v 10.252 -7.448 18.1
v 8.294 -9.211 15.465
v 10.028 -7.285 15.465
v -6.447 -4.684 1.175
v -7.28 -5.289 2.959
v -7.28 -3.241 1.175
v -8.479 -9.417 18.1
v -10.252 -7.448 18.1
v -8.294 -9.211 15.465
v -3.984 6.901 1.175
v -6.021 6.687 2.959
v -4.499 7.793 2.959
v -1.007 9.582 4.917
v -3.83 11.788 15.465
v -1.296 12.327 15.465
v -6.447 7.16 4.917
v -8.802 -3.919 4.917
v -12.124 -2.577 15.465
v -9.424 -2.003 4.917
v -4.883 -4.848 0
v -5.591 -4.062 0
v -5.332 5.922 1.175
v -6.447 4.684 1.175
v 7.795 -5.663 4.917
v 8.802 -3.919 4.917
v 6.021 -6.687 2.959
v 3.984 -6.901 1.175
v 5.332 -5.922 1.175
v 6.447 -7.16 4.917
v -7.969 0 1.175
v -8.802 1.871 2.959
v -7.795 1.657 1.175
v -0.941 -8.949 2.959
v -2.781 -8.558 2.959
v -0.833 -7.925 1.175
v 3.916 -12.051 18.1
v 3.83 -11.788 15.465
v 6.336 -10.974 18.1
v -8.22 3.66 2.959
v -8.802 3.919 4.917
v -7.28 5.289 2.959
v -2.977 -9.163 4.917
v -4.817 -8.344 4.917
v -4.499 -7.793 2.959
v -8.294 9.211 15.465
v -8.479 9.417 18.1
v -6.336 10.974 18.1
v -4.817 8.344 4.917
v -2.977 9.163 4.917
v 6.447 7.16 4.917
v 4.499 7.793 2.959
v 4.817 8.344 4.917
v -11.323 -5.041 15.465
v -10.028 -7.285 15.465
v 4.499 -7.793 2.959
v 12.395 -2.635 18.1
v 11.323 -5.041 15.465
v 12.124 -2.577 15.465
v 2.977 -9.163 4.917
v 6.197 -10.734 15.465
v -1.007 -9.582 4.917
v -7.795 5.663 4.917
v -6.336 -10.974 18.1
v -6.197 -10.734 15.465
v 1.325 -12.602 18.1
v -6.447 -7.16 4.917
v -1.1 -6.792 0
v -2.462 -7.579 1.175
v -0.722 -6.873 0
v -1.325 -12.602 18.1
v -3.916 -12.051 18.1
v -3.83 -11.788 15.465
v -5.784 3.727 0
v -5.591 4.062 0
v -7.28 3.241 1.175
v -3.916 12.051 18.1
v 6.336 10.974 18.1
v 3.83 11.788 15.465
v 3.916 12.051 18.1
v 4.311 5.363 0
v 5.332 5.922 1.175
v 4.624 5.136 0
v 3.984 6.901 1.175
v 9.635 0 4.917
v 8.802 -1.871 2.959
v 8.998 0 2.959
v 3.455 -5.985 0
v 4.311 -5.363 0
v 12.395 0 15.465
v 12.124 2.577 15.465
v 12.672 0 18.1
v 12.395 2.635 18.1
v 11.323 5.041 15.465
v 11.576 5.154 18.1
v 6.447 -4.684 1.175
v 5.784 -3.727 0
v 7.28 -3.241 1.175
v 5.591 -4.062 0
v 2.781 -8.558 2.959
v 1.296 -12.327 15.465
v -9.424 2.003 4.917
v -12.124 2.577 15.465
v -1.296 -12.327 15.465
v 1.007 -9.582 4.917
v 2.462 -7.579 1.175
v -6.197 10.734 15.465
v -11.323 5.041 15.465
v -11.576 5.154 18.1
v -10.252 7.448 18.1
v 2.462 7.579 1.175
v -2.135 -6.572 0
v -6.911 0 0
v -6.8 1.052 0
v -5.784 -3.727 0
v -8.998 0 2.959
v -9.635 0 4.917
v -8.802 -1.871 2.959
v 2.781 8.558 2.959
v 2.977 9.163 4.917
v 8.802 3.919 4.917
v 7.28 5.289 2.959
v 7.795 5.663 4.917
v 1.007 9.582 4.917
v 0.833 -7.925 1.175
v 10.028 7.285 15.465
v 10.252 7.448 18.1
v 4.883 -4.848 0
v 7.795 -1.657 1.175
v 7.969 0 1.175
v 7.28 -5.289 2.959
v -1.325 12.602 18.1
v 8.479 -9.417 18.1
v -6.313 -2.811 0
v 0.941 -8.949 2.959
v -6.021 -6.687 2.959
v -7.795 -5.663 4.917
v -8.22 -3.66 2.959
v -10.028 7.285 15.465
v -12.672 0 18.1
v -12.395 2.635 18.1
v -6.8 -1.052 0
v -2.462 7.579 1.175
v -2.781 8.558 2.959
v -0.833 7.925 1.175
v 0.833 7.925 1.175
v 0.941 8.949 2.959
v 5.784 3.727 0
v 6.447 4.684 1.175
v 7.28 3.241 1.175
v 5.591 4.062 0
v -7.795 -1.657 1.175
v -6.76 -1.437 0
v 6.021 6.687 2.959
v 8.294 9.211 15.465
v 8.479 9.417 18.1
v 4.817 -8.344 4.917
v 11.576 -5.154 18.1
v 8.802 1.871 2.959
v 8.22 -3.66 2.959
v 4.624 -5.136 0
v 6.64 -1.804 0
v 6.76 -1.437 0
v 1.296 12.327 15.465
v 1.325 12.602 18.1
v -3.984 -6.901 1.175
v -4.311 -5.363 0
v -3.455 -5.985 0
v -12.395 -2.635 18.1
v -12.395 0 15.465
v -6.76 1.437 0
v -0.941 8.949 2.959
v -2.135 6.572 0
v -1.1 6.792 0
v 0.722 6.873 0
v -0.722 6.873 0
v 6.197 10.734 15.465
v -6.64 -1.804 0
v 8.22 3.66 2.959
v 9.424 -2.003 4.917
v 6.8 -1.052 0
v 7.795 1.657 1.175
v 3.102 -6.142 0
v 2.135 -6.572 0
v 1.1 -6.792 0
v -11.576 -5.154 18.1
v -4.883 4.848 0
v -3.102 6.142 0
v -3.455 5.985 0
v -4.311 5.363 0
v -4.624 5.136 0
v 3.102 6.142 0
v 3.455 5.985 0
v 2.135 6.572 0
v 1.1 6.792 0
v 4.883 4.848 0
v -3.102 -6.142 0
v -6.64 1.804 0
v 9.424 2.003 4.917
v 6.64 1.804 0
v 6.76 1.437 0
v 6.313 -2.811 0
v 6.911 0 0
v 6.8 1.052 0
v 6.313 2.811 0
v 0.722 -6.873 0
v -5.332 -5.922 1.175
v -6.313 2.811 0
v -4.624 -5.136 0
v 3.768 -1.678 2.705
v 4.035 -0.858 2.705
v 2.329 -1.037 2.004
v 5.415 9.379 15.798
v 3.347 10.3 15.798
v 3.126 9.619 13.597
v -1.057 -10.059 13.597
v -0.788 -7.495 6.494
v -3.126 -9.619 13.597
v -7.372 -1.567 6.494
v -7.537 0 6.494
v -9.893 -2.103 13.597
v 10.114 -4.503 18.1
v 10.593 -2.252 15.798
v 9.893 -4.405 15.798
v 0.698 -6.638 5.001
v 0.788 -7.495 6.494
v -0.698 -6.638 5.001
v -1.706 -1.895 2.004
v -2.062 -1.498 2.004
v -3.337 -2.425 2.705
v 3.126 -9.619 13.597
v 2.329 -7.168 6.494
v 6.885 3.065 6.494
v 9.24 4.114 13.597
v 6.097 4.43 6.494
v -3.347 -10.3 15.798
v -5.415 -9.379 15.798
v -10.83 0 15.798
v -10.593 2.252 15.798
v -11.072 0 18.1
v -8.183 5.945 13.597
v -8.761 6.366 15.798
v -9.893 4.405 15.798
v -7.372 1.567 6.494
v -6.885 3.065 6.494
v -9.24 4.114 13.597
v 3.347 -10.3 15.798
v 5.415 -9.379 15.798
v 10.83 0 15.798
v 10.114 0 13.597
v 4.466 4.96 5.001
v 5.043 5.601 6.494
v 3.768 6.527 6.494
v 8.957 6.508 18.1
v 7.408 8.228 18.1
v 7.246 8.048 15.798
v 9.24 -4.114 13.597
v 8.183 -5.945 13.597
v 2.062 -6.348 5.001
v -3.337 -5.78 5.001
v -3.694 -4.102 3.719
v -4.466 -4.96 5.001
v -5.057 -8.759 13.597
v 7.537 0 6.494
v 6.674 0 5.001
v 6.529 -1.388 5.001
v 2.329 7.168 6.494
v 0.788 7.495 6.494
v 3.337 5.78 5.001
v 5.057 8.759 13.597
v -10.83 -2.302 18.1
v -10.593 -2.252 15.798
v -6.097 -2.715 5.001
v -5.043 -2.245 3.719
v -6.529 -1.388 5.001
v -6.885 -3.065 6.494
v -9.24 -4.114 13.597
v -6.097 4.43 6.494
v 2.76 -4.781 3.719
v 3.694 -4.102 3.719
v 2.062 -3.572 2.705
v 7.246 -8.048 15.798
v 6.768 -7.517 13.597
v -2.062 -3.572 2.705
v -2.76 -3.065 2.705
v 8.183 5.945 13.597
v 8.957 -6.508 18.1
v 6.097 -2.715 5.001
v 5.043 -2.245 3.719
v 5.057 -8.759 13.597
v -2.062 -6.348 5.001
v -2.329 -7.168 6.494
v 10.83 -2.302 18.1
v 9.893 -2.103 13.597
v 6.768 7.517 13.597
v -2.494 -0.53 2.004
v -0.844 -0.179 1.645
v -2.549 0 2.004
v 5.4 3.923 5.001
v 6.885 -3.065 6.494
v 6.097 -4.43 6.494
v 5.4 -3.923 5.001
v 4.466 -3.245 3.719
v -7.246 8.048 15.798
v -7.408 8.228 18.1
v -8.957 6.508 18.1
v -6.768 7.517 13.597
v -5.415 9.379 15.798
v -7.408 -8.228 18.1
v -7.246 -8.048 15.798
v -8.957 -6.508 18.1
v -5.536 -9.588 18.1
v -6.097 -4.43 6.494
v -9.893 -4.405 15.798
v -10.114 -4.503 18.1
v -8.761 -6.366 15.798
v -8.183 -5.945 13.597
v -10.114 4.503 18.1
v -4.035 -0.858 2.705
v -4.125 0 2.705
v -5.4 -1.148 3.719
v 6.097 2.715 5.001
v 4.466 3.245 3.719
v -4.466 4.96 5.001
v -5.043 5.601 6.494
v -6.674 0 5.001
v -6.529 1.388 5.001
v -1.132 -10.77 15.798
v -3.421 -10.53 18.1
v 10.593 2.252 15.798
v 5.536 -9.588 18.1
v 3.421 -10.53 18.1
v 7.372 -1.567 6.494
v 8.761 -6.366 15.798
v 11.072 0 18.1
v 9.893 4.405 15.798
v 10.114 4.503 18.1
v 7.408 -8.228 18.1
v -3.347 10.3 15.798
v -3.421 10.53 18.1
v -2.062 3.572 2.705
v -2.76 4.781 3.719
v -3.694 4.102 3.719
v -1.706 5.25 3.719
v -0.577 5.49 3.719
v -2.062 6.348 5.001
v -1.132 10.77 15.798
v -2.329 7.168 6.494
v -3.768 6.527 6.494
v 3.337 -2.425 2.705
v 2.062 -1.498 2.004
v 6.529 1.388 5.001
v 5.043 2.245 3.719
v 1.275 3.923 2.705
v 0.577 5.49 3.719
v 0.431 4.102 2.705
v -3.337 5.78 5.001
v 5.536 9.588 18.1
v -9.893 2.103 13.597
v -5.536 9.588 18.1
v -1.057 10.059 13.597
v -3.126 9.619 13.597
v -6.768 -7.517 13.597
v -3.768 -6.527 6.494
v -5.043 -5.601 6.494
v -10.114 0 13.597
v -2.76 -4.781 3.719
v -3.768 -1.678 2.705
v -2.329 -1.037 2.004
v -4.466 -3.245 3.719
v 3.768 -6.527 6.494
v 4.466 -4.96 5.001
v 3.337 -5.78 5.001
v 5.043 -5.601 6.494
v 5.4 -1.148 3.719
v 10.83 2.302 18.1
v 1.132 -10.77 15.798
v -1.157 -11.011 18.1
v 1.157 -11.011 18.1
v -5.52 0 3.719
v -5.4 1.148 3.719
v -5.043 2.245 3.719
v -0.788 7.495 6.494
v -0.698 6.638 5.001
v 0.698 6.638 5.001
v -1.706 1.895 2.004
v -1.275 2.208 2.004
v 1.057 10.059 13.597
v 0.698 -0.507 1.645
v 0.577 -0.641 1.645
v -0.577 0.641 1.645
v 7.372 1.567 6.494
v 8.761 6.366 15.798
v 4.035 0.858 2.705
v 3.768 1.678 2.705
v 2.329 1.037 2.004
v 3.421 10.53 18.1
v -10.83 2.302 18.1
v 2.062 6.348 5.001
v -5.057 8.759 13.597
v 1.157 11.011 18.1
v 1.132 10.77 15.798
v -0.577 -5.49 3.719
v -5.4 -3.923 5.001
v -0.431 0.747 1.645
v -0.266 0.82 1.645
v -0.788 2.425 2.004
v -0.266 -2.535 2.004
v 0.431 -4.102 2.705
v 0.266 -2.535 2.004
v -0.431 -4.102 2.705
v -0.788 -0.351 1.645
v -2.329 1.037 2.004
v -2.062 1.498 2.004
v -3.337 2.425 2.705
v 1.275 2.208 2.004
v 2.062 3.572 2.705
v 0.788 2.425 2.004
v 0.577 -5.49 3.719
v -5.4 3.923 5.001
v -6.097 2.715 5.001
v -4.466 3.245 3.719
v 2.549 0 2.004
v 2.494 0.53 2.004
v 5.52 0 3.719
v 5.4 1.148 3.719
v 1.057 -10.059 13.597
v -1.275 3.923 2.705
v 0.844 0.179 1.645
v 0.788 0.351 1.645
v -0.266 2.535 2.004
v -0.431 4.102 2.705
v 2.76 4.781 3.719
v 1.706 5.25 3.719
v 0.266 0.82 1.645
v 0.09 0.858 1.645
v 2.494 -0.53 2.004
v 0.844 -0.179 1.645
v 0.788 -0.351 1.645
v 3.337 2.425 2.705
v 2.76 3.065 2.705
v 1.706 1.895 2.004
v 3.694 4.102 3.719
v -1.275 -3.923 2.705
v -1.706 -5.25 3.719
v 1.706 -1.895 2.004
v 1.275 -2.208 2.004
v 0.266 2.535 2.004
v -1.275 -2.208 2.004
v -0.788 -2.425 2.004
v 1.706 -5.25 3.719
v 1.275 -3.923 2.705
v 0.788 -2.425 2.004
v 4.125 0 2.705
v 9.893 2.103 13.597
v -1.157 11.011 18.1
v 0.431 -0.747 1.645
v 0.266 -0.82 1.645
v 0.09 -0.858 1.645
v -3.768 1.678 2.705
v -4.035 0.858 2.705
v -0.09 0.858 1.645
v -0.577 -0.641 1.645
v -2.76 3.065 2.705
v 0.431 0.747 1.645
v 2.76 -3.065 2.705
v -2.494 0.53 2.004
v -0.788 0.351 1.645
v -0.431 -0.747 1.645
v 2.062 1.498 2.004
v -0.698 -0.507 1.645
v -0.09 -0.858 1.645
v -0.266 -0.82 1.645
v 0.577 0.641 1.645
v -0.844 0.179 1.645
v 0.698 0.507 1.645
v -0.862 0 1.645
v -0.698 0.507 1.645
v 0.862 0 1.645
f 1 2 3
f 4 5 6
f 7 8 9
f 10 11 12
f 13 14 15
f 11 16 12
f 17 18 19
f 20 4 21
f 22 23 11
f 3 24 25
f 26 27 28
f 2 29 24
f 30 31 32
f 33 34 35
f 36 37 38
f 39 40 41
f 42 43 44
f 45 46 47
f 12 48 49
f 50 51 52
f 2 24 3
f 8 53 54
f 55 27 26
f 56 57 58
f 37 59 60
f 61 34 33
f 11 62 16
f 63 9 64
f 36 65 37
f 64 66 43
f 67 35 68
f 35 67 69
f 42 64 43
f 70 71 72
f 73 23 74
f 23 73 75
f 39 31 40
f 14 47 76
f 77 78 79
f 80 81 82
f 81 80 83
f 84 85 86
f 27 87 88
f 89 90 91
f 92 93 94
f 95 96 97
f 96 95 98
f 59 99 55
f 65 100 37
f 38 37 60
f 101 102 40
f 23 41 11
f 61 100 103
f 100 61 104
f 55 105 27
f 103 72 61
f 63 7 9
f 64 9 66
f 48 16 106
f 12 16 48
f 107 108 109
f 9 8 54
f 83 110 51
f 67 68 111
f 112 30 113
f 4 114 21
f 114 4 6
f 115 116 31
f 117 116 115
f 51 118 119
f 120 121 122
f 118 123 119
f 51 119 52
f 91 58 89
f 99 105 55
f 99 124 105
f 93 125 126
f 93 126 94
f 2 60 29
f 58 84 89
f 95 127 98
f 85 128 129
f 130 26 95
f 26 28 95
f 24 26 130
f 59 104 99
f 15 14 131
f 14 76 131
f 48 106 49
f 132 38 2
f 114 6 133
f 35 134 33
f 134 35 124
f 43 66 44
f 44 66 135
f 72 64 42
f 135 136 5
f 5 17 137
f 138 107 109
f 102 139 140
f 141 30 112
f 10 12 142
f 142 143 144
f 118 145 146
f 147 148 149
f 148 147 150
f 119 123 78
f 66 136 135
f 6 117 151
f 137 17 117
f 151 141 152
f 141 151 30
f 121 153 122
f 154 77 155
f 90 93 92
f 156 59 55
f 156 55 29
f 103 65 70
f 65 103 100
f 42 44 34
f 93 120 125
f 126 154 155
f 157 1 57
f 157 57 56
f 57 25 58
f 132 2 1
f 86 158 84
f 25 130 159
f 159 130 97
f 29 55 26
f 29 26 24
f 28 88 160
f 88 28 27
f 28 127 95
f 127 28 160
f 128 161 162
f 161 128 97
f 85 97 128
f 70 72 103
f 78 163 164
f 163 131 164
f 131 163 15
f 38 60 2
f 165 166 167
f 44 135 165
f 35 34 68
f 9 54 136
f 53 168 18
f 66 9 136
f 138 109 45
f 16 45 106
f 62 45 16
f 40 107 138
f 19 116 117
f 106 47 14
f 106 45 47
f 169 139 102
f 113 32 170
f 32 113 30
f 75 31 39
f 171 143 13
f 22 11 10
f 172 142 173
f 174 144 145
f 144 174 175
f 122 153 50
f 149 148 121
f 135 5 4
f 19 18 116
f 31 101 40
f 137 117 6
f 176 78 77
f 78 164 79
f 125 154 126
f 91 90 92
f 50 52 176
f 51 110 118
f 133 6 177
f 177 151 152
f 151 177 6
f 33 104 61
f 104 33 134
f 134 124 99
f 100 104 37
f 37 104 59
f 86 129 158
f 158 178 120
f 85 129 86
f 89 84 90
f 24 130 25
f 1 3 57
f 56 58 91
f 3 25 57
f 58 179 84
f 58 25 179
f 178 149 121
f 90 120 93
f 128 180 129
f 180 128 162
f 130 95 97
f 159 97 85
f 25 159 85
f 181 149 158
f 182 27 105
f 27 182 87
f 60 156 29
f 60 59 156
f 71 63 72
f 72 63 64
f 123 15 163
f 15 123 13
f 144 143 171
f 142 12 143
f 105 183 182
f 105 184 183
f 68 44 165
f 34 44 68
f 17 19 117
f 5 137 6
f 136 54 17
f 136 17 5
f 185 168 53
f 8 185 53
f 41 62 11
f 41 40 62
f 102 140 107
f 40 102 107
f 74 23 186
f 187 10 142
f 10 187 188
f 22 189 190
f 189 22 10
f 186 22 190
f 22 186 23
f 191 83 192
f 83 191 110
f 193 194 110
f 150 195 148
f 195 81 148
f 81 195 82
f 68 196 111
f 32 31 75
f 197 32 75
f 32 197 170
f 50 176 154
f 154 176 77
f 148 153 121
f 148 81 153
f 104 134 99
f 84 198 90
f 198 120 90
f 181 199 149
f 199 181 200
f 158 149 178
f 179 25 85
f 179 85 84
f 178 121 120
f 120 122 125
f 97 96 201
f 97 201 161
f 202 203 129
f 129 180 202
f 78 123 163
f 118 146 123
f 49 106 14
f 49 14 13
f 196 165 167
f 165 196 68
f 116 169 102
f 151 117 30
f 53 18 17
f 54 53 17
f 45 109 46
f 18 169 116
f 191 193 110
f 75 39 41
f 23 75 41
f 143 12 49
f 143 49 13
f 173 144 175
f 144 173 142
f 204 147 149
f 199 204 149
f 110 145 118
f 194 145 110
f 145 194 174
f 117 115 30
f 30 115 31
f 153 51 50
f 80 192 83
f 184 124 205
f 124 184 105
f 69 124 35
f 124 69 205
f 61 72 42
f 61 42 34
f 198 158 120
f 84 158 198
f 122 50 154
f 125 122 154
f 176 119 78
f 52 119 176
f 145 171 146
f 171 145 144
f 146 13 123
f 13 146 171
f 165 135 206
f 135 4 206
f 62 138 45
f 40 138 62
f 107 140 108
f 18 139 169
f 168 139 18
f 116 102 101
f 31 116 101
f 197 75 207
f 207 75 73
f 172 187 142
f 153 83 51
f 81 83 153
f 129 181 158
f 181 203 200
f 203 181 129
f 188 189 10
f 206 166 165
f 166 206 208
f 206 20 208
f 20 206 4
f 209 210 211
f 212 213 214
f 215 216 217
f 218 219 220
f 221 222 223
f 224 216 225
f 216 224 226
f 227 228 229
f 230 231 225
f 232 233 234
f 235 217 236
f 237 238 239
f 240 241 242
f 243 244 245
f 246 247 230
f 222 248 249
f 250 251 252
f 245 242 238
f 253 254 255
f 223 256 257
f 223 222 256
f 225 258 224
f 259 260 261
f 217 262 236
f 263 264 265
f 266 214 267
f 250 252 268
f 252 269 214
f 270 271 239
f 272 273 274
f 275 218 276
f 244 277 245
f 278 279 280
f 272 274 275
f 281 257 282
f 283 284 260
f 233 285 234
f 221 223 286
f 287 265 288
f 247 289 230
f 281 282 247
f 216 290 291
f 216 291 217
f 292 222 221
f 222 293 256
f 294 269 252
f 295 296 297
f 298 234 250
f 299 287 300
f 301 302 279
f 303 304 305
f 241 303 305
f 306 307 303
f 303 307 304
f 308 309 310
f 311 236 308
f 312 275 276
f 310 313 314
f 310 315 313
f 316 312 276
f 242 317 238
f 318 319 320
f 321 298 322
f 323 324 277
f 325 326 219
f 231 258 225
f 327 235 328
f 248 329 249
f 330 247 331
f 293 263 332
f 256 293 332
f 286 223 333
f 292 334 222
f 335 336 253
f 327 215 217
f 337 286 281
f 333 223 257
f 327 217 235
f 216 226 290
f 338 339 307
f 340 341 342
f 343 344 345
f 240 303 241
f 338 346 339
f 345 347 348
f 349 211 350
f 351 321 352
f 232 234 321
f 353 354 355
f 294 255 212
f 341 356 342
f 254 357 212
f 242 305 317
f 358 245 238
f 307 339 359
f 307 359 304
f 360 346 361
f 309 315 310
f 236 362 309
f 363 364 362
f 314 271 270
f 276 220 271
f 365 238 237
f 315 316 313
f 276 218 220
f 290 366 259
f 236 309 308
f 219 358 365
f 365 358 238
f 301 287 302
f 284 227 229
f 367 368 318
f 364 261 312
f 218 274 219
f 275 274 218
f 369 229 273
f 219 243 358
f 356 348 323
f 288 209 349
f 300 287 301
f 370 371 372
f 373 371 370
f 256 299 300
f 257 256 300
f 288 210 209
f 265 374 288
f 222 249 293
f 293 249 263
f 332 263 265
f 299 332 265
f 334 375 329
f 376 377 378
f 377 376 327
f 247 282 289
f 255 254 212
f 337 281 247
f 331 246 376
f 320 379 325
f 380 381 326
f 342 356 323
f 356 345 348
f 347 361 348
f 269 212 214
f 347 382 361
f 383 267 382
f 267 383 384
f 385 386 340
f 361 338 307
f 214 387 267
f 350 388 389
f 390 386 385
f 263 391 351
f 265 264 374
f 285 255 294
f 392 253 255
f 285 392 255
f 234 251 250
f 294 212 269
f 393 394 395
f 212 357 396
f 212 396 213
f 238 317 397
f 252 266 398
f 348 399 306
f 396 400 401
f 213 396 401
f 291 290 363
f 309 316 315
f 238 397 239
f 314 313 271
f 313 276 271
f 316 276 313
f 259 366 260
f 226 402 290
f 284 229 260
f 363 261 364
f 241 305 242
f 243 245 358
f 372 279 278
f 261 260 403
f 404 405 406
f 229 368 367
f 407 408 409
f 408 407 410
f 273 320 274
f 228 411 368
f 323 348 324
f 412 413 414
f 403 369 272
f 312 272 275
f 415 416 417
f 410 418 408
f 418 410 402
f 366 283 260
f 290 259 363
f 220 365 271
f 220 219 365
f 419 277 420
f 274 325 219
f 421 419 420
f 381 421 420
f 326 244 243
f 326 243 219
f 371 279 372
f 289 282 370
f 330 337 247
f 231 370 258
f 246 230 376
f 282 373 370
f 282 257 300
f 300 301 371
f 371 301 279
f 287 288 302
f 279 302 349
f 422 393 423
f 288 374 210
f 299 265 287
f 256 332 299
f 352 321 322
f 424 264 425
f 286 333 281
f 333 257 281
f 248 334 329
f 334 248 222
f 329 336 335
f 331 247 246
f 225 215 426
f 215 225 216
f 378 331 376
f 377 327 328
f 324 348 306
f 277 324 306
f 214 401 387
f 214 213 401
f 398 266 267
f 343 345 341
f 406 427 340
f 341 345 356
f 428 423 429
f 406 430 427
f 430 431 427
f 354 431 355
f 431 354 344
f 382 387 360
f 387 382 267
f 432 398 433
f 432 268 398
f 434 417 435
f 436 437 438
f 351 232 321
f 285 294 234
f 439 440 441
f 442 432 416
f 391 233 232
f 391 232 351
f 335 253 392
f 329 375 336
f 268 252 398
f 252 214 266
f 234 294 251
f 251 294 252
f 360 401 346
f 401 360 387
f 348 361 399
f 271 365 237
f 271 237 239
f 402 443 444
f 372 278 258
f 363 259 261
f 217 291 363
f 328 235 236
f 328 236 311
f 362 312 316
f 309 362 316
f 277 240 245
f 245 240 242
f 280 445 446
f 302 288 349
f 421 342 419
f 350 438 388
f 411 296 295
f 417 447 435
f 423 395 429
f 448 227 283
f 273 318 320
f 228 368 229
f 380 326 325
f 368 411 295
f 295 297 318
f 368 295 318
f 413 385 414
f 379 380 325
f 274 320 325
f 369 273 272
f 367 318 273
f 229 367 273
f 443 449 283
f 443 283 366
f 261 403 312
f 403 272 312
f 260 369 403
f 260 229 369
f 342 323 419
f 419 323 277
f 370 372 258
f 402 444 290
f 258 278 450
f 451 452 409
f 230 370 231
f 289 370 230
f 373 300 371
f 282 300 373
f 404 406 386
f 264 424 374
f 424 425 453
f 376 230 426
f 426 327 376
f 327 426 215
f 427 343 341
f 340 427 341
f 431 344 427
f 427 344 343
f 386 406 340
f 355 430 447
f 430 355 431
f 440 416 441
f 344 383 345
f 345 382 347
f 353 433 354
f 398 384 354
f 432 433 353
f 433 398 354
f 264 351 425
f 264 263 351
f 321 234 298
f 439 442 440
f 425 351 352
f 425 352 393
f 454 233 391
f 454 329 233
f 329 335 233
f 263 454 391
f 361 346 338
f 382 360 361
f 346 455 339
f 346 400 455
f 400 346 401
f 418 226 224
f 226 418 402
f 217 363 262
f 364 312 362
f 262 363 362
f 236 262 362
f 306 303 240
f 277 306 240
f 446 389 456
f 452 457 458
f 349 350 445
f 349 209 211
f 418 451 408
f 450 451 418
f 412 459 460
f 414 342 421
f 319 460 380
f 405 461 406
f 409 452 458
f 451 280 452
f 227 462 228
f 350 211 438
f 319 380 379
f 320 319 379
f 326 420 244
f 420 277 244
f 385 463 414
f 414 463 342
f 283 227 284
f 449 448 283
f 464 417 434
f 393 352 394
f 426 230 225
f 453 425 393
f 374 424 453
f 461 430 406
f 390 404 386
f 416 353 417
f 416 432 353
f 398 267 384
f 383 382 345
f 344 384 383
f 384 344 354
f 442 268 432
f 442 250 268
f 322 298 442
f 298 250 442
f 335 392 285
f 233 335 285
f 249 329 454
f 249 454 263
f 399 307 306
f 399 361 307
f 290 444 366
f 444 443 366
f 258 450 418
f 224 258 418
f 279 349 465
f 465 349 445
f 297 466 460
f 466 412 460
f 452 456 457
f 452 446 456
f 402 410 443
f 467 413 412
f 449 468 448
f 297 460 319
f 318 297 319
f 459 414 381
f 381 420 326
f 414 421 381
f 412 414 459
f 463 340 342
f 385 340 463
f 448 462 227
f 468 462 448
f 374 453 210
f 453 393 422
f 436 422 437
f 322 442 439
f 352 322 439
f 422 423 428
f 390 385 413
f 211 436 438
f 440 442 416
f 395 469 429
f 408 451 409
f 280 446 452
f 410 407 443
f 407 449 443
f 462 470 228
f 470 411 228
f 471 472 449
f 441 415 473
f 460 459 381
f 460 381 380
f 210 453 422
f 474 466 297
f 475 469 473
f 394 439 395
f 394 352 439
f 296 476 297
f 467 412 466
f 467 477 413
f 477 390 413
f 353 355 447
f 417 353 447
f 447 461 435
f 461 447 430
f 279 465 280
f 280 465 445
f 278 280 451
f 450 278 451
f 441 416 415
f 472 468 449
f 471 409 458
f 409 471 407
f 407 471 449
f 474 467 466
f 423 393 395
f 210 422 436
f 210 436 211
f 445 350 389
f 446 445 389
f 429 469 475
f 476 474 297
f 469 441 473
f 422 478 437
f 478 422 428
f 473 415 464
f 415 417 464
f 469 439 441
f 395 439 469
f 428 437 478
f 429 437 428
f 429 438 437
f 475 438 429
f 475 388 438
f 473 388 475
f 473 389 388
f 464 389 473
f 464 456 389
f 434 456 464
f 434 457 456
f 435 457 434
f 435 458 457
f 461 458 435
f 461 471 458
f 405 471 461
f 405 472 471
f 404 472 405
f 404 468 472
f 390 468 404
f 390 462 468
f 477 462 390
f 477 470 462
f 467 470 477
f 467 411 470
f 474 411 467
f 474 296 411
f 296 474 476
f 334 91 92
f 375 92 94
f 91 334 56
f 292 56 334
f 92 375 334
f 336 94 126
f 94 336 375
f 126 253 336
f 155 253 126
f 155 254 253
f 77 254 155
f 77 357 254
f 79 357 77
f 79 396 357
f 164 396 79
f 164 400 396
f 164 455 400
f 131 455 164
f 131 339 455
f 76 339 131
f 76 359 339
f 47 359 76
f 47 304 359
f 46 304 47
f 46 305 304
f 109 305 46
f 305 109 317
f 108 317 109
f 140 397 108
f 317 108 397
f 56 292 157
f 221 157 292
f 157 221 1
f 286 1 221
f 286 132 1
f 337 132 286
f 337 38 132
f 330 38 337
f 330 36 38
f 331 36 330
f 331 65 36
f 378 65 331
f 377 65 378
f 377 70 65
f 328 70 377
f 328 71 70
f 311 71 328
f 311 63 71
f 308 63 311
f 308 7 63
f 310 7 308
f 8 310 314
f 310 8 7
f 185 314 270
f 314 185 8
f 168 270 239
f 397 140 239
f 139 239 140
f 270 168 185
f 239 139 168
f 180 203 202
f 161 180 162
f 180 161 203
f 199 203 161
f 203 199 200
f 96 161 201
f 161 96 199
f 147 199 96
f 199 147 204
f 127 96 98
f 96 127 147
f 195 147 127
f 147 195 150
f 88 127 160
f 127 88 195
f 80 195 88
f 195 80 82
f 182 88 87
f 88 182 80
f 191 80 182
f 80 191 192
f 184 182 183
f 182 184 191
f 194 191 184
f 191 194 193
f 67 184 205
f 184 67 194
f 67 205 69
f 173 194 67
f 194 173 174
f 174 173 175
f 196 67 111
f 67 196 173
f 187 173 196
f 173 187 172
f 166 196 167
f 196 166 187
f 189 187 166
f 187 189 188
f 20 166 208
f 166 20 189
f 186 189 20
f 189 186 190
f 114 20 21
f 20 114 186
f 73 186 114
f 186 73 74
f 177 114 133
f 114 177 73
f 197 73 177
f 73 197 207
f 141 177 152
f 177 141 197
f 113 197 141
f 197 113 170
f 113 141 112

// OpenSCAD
// title: parametric ballpocket
// license: public domain


/* [parameters] */

// inner base radius diameter
d = 16.5;
r = d/2;

// wall thickness
t = 1.6;

//additional hight in units of base radius
f = 1;
dh = r*f;

// opening angle
alpha = 20;
dr = dh * sin(alpha);

cut = "no"; // [no,yes]

/* [resolution] */

// maximal angle per segment (3 good & slow)
$fa = 12;
// minimal segment length (0.15 good slow)
$fs = 0.6;

eps = 0.05*1;


intersection()
{
difference()
{
  // outer cylinder
  //translate([0,0,0])
  //cylinder(r1=r+t,r2=r+t+dr,h=r+t+dh,center=false);

  hull()
  {
    translate([0,0,r+t-(r+t)*(1-1/sqrt(2))])
    sphere(r+t);
    translate([0,0,r+t+dh])
    sphere(r+dr+t);  
  }

  hull()
  {
    translate([0,0,r+t])
    sphere(r);
    translate([0,0,r+t+dh])
    sphere(r+dr);  
  }
  //translate([0,0,r+t])
  //cylinder(r1=r,r2=r+dr,h=r+t+dh+eps,center=false);

  if(cut == "yes")
  {  translate([0,0,-1]) cube([100,100,100]); }
}
  translate([0,0,(r+t+dh)/2])
  cube([100,100,r+t+dh],center=true);

}
